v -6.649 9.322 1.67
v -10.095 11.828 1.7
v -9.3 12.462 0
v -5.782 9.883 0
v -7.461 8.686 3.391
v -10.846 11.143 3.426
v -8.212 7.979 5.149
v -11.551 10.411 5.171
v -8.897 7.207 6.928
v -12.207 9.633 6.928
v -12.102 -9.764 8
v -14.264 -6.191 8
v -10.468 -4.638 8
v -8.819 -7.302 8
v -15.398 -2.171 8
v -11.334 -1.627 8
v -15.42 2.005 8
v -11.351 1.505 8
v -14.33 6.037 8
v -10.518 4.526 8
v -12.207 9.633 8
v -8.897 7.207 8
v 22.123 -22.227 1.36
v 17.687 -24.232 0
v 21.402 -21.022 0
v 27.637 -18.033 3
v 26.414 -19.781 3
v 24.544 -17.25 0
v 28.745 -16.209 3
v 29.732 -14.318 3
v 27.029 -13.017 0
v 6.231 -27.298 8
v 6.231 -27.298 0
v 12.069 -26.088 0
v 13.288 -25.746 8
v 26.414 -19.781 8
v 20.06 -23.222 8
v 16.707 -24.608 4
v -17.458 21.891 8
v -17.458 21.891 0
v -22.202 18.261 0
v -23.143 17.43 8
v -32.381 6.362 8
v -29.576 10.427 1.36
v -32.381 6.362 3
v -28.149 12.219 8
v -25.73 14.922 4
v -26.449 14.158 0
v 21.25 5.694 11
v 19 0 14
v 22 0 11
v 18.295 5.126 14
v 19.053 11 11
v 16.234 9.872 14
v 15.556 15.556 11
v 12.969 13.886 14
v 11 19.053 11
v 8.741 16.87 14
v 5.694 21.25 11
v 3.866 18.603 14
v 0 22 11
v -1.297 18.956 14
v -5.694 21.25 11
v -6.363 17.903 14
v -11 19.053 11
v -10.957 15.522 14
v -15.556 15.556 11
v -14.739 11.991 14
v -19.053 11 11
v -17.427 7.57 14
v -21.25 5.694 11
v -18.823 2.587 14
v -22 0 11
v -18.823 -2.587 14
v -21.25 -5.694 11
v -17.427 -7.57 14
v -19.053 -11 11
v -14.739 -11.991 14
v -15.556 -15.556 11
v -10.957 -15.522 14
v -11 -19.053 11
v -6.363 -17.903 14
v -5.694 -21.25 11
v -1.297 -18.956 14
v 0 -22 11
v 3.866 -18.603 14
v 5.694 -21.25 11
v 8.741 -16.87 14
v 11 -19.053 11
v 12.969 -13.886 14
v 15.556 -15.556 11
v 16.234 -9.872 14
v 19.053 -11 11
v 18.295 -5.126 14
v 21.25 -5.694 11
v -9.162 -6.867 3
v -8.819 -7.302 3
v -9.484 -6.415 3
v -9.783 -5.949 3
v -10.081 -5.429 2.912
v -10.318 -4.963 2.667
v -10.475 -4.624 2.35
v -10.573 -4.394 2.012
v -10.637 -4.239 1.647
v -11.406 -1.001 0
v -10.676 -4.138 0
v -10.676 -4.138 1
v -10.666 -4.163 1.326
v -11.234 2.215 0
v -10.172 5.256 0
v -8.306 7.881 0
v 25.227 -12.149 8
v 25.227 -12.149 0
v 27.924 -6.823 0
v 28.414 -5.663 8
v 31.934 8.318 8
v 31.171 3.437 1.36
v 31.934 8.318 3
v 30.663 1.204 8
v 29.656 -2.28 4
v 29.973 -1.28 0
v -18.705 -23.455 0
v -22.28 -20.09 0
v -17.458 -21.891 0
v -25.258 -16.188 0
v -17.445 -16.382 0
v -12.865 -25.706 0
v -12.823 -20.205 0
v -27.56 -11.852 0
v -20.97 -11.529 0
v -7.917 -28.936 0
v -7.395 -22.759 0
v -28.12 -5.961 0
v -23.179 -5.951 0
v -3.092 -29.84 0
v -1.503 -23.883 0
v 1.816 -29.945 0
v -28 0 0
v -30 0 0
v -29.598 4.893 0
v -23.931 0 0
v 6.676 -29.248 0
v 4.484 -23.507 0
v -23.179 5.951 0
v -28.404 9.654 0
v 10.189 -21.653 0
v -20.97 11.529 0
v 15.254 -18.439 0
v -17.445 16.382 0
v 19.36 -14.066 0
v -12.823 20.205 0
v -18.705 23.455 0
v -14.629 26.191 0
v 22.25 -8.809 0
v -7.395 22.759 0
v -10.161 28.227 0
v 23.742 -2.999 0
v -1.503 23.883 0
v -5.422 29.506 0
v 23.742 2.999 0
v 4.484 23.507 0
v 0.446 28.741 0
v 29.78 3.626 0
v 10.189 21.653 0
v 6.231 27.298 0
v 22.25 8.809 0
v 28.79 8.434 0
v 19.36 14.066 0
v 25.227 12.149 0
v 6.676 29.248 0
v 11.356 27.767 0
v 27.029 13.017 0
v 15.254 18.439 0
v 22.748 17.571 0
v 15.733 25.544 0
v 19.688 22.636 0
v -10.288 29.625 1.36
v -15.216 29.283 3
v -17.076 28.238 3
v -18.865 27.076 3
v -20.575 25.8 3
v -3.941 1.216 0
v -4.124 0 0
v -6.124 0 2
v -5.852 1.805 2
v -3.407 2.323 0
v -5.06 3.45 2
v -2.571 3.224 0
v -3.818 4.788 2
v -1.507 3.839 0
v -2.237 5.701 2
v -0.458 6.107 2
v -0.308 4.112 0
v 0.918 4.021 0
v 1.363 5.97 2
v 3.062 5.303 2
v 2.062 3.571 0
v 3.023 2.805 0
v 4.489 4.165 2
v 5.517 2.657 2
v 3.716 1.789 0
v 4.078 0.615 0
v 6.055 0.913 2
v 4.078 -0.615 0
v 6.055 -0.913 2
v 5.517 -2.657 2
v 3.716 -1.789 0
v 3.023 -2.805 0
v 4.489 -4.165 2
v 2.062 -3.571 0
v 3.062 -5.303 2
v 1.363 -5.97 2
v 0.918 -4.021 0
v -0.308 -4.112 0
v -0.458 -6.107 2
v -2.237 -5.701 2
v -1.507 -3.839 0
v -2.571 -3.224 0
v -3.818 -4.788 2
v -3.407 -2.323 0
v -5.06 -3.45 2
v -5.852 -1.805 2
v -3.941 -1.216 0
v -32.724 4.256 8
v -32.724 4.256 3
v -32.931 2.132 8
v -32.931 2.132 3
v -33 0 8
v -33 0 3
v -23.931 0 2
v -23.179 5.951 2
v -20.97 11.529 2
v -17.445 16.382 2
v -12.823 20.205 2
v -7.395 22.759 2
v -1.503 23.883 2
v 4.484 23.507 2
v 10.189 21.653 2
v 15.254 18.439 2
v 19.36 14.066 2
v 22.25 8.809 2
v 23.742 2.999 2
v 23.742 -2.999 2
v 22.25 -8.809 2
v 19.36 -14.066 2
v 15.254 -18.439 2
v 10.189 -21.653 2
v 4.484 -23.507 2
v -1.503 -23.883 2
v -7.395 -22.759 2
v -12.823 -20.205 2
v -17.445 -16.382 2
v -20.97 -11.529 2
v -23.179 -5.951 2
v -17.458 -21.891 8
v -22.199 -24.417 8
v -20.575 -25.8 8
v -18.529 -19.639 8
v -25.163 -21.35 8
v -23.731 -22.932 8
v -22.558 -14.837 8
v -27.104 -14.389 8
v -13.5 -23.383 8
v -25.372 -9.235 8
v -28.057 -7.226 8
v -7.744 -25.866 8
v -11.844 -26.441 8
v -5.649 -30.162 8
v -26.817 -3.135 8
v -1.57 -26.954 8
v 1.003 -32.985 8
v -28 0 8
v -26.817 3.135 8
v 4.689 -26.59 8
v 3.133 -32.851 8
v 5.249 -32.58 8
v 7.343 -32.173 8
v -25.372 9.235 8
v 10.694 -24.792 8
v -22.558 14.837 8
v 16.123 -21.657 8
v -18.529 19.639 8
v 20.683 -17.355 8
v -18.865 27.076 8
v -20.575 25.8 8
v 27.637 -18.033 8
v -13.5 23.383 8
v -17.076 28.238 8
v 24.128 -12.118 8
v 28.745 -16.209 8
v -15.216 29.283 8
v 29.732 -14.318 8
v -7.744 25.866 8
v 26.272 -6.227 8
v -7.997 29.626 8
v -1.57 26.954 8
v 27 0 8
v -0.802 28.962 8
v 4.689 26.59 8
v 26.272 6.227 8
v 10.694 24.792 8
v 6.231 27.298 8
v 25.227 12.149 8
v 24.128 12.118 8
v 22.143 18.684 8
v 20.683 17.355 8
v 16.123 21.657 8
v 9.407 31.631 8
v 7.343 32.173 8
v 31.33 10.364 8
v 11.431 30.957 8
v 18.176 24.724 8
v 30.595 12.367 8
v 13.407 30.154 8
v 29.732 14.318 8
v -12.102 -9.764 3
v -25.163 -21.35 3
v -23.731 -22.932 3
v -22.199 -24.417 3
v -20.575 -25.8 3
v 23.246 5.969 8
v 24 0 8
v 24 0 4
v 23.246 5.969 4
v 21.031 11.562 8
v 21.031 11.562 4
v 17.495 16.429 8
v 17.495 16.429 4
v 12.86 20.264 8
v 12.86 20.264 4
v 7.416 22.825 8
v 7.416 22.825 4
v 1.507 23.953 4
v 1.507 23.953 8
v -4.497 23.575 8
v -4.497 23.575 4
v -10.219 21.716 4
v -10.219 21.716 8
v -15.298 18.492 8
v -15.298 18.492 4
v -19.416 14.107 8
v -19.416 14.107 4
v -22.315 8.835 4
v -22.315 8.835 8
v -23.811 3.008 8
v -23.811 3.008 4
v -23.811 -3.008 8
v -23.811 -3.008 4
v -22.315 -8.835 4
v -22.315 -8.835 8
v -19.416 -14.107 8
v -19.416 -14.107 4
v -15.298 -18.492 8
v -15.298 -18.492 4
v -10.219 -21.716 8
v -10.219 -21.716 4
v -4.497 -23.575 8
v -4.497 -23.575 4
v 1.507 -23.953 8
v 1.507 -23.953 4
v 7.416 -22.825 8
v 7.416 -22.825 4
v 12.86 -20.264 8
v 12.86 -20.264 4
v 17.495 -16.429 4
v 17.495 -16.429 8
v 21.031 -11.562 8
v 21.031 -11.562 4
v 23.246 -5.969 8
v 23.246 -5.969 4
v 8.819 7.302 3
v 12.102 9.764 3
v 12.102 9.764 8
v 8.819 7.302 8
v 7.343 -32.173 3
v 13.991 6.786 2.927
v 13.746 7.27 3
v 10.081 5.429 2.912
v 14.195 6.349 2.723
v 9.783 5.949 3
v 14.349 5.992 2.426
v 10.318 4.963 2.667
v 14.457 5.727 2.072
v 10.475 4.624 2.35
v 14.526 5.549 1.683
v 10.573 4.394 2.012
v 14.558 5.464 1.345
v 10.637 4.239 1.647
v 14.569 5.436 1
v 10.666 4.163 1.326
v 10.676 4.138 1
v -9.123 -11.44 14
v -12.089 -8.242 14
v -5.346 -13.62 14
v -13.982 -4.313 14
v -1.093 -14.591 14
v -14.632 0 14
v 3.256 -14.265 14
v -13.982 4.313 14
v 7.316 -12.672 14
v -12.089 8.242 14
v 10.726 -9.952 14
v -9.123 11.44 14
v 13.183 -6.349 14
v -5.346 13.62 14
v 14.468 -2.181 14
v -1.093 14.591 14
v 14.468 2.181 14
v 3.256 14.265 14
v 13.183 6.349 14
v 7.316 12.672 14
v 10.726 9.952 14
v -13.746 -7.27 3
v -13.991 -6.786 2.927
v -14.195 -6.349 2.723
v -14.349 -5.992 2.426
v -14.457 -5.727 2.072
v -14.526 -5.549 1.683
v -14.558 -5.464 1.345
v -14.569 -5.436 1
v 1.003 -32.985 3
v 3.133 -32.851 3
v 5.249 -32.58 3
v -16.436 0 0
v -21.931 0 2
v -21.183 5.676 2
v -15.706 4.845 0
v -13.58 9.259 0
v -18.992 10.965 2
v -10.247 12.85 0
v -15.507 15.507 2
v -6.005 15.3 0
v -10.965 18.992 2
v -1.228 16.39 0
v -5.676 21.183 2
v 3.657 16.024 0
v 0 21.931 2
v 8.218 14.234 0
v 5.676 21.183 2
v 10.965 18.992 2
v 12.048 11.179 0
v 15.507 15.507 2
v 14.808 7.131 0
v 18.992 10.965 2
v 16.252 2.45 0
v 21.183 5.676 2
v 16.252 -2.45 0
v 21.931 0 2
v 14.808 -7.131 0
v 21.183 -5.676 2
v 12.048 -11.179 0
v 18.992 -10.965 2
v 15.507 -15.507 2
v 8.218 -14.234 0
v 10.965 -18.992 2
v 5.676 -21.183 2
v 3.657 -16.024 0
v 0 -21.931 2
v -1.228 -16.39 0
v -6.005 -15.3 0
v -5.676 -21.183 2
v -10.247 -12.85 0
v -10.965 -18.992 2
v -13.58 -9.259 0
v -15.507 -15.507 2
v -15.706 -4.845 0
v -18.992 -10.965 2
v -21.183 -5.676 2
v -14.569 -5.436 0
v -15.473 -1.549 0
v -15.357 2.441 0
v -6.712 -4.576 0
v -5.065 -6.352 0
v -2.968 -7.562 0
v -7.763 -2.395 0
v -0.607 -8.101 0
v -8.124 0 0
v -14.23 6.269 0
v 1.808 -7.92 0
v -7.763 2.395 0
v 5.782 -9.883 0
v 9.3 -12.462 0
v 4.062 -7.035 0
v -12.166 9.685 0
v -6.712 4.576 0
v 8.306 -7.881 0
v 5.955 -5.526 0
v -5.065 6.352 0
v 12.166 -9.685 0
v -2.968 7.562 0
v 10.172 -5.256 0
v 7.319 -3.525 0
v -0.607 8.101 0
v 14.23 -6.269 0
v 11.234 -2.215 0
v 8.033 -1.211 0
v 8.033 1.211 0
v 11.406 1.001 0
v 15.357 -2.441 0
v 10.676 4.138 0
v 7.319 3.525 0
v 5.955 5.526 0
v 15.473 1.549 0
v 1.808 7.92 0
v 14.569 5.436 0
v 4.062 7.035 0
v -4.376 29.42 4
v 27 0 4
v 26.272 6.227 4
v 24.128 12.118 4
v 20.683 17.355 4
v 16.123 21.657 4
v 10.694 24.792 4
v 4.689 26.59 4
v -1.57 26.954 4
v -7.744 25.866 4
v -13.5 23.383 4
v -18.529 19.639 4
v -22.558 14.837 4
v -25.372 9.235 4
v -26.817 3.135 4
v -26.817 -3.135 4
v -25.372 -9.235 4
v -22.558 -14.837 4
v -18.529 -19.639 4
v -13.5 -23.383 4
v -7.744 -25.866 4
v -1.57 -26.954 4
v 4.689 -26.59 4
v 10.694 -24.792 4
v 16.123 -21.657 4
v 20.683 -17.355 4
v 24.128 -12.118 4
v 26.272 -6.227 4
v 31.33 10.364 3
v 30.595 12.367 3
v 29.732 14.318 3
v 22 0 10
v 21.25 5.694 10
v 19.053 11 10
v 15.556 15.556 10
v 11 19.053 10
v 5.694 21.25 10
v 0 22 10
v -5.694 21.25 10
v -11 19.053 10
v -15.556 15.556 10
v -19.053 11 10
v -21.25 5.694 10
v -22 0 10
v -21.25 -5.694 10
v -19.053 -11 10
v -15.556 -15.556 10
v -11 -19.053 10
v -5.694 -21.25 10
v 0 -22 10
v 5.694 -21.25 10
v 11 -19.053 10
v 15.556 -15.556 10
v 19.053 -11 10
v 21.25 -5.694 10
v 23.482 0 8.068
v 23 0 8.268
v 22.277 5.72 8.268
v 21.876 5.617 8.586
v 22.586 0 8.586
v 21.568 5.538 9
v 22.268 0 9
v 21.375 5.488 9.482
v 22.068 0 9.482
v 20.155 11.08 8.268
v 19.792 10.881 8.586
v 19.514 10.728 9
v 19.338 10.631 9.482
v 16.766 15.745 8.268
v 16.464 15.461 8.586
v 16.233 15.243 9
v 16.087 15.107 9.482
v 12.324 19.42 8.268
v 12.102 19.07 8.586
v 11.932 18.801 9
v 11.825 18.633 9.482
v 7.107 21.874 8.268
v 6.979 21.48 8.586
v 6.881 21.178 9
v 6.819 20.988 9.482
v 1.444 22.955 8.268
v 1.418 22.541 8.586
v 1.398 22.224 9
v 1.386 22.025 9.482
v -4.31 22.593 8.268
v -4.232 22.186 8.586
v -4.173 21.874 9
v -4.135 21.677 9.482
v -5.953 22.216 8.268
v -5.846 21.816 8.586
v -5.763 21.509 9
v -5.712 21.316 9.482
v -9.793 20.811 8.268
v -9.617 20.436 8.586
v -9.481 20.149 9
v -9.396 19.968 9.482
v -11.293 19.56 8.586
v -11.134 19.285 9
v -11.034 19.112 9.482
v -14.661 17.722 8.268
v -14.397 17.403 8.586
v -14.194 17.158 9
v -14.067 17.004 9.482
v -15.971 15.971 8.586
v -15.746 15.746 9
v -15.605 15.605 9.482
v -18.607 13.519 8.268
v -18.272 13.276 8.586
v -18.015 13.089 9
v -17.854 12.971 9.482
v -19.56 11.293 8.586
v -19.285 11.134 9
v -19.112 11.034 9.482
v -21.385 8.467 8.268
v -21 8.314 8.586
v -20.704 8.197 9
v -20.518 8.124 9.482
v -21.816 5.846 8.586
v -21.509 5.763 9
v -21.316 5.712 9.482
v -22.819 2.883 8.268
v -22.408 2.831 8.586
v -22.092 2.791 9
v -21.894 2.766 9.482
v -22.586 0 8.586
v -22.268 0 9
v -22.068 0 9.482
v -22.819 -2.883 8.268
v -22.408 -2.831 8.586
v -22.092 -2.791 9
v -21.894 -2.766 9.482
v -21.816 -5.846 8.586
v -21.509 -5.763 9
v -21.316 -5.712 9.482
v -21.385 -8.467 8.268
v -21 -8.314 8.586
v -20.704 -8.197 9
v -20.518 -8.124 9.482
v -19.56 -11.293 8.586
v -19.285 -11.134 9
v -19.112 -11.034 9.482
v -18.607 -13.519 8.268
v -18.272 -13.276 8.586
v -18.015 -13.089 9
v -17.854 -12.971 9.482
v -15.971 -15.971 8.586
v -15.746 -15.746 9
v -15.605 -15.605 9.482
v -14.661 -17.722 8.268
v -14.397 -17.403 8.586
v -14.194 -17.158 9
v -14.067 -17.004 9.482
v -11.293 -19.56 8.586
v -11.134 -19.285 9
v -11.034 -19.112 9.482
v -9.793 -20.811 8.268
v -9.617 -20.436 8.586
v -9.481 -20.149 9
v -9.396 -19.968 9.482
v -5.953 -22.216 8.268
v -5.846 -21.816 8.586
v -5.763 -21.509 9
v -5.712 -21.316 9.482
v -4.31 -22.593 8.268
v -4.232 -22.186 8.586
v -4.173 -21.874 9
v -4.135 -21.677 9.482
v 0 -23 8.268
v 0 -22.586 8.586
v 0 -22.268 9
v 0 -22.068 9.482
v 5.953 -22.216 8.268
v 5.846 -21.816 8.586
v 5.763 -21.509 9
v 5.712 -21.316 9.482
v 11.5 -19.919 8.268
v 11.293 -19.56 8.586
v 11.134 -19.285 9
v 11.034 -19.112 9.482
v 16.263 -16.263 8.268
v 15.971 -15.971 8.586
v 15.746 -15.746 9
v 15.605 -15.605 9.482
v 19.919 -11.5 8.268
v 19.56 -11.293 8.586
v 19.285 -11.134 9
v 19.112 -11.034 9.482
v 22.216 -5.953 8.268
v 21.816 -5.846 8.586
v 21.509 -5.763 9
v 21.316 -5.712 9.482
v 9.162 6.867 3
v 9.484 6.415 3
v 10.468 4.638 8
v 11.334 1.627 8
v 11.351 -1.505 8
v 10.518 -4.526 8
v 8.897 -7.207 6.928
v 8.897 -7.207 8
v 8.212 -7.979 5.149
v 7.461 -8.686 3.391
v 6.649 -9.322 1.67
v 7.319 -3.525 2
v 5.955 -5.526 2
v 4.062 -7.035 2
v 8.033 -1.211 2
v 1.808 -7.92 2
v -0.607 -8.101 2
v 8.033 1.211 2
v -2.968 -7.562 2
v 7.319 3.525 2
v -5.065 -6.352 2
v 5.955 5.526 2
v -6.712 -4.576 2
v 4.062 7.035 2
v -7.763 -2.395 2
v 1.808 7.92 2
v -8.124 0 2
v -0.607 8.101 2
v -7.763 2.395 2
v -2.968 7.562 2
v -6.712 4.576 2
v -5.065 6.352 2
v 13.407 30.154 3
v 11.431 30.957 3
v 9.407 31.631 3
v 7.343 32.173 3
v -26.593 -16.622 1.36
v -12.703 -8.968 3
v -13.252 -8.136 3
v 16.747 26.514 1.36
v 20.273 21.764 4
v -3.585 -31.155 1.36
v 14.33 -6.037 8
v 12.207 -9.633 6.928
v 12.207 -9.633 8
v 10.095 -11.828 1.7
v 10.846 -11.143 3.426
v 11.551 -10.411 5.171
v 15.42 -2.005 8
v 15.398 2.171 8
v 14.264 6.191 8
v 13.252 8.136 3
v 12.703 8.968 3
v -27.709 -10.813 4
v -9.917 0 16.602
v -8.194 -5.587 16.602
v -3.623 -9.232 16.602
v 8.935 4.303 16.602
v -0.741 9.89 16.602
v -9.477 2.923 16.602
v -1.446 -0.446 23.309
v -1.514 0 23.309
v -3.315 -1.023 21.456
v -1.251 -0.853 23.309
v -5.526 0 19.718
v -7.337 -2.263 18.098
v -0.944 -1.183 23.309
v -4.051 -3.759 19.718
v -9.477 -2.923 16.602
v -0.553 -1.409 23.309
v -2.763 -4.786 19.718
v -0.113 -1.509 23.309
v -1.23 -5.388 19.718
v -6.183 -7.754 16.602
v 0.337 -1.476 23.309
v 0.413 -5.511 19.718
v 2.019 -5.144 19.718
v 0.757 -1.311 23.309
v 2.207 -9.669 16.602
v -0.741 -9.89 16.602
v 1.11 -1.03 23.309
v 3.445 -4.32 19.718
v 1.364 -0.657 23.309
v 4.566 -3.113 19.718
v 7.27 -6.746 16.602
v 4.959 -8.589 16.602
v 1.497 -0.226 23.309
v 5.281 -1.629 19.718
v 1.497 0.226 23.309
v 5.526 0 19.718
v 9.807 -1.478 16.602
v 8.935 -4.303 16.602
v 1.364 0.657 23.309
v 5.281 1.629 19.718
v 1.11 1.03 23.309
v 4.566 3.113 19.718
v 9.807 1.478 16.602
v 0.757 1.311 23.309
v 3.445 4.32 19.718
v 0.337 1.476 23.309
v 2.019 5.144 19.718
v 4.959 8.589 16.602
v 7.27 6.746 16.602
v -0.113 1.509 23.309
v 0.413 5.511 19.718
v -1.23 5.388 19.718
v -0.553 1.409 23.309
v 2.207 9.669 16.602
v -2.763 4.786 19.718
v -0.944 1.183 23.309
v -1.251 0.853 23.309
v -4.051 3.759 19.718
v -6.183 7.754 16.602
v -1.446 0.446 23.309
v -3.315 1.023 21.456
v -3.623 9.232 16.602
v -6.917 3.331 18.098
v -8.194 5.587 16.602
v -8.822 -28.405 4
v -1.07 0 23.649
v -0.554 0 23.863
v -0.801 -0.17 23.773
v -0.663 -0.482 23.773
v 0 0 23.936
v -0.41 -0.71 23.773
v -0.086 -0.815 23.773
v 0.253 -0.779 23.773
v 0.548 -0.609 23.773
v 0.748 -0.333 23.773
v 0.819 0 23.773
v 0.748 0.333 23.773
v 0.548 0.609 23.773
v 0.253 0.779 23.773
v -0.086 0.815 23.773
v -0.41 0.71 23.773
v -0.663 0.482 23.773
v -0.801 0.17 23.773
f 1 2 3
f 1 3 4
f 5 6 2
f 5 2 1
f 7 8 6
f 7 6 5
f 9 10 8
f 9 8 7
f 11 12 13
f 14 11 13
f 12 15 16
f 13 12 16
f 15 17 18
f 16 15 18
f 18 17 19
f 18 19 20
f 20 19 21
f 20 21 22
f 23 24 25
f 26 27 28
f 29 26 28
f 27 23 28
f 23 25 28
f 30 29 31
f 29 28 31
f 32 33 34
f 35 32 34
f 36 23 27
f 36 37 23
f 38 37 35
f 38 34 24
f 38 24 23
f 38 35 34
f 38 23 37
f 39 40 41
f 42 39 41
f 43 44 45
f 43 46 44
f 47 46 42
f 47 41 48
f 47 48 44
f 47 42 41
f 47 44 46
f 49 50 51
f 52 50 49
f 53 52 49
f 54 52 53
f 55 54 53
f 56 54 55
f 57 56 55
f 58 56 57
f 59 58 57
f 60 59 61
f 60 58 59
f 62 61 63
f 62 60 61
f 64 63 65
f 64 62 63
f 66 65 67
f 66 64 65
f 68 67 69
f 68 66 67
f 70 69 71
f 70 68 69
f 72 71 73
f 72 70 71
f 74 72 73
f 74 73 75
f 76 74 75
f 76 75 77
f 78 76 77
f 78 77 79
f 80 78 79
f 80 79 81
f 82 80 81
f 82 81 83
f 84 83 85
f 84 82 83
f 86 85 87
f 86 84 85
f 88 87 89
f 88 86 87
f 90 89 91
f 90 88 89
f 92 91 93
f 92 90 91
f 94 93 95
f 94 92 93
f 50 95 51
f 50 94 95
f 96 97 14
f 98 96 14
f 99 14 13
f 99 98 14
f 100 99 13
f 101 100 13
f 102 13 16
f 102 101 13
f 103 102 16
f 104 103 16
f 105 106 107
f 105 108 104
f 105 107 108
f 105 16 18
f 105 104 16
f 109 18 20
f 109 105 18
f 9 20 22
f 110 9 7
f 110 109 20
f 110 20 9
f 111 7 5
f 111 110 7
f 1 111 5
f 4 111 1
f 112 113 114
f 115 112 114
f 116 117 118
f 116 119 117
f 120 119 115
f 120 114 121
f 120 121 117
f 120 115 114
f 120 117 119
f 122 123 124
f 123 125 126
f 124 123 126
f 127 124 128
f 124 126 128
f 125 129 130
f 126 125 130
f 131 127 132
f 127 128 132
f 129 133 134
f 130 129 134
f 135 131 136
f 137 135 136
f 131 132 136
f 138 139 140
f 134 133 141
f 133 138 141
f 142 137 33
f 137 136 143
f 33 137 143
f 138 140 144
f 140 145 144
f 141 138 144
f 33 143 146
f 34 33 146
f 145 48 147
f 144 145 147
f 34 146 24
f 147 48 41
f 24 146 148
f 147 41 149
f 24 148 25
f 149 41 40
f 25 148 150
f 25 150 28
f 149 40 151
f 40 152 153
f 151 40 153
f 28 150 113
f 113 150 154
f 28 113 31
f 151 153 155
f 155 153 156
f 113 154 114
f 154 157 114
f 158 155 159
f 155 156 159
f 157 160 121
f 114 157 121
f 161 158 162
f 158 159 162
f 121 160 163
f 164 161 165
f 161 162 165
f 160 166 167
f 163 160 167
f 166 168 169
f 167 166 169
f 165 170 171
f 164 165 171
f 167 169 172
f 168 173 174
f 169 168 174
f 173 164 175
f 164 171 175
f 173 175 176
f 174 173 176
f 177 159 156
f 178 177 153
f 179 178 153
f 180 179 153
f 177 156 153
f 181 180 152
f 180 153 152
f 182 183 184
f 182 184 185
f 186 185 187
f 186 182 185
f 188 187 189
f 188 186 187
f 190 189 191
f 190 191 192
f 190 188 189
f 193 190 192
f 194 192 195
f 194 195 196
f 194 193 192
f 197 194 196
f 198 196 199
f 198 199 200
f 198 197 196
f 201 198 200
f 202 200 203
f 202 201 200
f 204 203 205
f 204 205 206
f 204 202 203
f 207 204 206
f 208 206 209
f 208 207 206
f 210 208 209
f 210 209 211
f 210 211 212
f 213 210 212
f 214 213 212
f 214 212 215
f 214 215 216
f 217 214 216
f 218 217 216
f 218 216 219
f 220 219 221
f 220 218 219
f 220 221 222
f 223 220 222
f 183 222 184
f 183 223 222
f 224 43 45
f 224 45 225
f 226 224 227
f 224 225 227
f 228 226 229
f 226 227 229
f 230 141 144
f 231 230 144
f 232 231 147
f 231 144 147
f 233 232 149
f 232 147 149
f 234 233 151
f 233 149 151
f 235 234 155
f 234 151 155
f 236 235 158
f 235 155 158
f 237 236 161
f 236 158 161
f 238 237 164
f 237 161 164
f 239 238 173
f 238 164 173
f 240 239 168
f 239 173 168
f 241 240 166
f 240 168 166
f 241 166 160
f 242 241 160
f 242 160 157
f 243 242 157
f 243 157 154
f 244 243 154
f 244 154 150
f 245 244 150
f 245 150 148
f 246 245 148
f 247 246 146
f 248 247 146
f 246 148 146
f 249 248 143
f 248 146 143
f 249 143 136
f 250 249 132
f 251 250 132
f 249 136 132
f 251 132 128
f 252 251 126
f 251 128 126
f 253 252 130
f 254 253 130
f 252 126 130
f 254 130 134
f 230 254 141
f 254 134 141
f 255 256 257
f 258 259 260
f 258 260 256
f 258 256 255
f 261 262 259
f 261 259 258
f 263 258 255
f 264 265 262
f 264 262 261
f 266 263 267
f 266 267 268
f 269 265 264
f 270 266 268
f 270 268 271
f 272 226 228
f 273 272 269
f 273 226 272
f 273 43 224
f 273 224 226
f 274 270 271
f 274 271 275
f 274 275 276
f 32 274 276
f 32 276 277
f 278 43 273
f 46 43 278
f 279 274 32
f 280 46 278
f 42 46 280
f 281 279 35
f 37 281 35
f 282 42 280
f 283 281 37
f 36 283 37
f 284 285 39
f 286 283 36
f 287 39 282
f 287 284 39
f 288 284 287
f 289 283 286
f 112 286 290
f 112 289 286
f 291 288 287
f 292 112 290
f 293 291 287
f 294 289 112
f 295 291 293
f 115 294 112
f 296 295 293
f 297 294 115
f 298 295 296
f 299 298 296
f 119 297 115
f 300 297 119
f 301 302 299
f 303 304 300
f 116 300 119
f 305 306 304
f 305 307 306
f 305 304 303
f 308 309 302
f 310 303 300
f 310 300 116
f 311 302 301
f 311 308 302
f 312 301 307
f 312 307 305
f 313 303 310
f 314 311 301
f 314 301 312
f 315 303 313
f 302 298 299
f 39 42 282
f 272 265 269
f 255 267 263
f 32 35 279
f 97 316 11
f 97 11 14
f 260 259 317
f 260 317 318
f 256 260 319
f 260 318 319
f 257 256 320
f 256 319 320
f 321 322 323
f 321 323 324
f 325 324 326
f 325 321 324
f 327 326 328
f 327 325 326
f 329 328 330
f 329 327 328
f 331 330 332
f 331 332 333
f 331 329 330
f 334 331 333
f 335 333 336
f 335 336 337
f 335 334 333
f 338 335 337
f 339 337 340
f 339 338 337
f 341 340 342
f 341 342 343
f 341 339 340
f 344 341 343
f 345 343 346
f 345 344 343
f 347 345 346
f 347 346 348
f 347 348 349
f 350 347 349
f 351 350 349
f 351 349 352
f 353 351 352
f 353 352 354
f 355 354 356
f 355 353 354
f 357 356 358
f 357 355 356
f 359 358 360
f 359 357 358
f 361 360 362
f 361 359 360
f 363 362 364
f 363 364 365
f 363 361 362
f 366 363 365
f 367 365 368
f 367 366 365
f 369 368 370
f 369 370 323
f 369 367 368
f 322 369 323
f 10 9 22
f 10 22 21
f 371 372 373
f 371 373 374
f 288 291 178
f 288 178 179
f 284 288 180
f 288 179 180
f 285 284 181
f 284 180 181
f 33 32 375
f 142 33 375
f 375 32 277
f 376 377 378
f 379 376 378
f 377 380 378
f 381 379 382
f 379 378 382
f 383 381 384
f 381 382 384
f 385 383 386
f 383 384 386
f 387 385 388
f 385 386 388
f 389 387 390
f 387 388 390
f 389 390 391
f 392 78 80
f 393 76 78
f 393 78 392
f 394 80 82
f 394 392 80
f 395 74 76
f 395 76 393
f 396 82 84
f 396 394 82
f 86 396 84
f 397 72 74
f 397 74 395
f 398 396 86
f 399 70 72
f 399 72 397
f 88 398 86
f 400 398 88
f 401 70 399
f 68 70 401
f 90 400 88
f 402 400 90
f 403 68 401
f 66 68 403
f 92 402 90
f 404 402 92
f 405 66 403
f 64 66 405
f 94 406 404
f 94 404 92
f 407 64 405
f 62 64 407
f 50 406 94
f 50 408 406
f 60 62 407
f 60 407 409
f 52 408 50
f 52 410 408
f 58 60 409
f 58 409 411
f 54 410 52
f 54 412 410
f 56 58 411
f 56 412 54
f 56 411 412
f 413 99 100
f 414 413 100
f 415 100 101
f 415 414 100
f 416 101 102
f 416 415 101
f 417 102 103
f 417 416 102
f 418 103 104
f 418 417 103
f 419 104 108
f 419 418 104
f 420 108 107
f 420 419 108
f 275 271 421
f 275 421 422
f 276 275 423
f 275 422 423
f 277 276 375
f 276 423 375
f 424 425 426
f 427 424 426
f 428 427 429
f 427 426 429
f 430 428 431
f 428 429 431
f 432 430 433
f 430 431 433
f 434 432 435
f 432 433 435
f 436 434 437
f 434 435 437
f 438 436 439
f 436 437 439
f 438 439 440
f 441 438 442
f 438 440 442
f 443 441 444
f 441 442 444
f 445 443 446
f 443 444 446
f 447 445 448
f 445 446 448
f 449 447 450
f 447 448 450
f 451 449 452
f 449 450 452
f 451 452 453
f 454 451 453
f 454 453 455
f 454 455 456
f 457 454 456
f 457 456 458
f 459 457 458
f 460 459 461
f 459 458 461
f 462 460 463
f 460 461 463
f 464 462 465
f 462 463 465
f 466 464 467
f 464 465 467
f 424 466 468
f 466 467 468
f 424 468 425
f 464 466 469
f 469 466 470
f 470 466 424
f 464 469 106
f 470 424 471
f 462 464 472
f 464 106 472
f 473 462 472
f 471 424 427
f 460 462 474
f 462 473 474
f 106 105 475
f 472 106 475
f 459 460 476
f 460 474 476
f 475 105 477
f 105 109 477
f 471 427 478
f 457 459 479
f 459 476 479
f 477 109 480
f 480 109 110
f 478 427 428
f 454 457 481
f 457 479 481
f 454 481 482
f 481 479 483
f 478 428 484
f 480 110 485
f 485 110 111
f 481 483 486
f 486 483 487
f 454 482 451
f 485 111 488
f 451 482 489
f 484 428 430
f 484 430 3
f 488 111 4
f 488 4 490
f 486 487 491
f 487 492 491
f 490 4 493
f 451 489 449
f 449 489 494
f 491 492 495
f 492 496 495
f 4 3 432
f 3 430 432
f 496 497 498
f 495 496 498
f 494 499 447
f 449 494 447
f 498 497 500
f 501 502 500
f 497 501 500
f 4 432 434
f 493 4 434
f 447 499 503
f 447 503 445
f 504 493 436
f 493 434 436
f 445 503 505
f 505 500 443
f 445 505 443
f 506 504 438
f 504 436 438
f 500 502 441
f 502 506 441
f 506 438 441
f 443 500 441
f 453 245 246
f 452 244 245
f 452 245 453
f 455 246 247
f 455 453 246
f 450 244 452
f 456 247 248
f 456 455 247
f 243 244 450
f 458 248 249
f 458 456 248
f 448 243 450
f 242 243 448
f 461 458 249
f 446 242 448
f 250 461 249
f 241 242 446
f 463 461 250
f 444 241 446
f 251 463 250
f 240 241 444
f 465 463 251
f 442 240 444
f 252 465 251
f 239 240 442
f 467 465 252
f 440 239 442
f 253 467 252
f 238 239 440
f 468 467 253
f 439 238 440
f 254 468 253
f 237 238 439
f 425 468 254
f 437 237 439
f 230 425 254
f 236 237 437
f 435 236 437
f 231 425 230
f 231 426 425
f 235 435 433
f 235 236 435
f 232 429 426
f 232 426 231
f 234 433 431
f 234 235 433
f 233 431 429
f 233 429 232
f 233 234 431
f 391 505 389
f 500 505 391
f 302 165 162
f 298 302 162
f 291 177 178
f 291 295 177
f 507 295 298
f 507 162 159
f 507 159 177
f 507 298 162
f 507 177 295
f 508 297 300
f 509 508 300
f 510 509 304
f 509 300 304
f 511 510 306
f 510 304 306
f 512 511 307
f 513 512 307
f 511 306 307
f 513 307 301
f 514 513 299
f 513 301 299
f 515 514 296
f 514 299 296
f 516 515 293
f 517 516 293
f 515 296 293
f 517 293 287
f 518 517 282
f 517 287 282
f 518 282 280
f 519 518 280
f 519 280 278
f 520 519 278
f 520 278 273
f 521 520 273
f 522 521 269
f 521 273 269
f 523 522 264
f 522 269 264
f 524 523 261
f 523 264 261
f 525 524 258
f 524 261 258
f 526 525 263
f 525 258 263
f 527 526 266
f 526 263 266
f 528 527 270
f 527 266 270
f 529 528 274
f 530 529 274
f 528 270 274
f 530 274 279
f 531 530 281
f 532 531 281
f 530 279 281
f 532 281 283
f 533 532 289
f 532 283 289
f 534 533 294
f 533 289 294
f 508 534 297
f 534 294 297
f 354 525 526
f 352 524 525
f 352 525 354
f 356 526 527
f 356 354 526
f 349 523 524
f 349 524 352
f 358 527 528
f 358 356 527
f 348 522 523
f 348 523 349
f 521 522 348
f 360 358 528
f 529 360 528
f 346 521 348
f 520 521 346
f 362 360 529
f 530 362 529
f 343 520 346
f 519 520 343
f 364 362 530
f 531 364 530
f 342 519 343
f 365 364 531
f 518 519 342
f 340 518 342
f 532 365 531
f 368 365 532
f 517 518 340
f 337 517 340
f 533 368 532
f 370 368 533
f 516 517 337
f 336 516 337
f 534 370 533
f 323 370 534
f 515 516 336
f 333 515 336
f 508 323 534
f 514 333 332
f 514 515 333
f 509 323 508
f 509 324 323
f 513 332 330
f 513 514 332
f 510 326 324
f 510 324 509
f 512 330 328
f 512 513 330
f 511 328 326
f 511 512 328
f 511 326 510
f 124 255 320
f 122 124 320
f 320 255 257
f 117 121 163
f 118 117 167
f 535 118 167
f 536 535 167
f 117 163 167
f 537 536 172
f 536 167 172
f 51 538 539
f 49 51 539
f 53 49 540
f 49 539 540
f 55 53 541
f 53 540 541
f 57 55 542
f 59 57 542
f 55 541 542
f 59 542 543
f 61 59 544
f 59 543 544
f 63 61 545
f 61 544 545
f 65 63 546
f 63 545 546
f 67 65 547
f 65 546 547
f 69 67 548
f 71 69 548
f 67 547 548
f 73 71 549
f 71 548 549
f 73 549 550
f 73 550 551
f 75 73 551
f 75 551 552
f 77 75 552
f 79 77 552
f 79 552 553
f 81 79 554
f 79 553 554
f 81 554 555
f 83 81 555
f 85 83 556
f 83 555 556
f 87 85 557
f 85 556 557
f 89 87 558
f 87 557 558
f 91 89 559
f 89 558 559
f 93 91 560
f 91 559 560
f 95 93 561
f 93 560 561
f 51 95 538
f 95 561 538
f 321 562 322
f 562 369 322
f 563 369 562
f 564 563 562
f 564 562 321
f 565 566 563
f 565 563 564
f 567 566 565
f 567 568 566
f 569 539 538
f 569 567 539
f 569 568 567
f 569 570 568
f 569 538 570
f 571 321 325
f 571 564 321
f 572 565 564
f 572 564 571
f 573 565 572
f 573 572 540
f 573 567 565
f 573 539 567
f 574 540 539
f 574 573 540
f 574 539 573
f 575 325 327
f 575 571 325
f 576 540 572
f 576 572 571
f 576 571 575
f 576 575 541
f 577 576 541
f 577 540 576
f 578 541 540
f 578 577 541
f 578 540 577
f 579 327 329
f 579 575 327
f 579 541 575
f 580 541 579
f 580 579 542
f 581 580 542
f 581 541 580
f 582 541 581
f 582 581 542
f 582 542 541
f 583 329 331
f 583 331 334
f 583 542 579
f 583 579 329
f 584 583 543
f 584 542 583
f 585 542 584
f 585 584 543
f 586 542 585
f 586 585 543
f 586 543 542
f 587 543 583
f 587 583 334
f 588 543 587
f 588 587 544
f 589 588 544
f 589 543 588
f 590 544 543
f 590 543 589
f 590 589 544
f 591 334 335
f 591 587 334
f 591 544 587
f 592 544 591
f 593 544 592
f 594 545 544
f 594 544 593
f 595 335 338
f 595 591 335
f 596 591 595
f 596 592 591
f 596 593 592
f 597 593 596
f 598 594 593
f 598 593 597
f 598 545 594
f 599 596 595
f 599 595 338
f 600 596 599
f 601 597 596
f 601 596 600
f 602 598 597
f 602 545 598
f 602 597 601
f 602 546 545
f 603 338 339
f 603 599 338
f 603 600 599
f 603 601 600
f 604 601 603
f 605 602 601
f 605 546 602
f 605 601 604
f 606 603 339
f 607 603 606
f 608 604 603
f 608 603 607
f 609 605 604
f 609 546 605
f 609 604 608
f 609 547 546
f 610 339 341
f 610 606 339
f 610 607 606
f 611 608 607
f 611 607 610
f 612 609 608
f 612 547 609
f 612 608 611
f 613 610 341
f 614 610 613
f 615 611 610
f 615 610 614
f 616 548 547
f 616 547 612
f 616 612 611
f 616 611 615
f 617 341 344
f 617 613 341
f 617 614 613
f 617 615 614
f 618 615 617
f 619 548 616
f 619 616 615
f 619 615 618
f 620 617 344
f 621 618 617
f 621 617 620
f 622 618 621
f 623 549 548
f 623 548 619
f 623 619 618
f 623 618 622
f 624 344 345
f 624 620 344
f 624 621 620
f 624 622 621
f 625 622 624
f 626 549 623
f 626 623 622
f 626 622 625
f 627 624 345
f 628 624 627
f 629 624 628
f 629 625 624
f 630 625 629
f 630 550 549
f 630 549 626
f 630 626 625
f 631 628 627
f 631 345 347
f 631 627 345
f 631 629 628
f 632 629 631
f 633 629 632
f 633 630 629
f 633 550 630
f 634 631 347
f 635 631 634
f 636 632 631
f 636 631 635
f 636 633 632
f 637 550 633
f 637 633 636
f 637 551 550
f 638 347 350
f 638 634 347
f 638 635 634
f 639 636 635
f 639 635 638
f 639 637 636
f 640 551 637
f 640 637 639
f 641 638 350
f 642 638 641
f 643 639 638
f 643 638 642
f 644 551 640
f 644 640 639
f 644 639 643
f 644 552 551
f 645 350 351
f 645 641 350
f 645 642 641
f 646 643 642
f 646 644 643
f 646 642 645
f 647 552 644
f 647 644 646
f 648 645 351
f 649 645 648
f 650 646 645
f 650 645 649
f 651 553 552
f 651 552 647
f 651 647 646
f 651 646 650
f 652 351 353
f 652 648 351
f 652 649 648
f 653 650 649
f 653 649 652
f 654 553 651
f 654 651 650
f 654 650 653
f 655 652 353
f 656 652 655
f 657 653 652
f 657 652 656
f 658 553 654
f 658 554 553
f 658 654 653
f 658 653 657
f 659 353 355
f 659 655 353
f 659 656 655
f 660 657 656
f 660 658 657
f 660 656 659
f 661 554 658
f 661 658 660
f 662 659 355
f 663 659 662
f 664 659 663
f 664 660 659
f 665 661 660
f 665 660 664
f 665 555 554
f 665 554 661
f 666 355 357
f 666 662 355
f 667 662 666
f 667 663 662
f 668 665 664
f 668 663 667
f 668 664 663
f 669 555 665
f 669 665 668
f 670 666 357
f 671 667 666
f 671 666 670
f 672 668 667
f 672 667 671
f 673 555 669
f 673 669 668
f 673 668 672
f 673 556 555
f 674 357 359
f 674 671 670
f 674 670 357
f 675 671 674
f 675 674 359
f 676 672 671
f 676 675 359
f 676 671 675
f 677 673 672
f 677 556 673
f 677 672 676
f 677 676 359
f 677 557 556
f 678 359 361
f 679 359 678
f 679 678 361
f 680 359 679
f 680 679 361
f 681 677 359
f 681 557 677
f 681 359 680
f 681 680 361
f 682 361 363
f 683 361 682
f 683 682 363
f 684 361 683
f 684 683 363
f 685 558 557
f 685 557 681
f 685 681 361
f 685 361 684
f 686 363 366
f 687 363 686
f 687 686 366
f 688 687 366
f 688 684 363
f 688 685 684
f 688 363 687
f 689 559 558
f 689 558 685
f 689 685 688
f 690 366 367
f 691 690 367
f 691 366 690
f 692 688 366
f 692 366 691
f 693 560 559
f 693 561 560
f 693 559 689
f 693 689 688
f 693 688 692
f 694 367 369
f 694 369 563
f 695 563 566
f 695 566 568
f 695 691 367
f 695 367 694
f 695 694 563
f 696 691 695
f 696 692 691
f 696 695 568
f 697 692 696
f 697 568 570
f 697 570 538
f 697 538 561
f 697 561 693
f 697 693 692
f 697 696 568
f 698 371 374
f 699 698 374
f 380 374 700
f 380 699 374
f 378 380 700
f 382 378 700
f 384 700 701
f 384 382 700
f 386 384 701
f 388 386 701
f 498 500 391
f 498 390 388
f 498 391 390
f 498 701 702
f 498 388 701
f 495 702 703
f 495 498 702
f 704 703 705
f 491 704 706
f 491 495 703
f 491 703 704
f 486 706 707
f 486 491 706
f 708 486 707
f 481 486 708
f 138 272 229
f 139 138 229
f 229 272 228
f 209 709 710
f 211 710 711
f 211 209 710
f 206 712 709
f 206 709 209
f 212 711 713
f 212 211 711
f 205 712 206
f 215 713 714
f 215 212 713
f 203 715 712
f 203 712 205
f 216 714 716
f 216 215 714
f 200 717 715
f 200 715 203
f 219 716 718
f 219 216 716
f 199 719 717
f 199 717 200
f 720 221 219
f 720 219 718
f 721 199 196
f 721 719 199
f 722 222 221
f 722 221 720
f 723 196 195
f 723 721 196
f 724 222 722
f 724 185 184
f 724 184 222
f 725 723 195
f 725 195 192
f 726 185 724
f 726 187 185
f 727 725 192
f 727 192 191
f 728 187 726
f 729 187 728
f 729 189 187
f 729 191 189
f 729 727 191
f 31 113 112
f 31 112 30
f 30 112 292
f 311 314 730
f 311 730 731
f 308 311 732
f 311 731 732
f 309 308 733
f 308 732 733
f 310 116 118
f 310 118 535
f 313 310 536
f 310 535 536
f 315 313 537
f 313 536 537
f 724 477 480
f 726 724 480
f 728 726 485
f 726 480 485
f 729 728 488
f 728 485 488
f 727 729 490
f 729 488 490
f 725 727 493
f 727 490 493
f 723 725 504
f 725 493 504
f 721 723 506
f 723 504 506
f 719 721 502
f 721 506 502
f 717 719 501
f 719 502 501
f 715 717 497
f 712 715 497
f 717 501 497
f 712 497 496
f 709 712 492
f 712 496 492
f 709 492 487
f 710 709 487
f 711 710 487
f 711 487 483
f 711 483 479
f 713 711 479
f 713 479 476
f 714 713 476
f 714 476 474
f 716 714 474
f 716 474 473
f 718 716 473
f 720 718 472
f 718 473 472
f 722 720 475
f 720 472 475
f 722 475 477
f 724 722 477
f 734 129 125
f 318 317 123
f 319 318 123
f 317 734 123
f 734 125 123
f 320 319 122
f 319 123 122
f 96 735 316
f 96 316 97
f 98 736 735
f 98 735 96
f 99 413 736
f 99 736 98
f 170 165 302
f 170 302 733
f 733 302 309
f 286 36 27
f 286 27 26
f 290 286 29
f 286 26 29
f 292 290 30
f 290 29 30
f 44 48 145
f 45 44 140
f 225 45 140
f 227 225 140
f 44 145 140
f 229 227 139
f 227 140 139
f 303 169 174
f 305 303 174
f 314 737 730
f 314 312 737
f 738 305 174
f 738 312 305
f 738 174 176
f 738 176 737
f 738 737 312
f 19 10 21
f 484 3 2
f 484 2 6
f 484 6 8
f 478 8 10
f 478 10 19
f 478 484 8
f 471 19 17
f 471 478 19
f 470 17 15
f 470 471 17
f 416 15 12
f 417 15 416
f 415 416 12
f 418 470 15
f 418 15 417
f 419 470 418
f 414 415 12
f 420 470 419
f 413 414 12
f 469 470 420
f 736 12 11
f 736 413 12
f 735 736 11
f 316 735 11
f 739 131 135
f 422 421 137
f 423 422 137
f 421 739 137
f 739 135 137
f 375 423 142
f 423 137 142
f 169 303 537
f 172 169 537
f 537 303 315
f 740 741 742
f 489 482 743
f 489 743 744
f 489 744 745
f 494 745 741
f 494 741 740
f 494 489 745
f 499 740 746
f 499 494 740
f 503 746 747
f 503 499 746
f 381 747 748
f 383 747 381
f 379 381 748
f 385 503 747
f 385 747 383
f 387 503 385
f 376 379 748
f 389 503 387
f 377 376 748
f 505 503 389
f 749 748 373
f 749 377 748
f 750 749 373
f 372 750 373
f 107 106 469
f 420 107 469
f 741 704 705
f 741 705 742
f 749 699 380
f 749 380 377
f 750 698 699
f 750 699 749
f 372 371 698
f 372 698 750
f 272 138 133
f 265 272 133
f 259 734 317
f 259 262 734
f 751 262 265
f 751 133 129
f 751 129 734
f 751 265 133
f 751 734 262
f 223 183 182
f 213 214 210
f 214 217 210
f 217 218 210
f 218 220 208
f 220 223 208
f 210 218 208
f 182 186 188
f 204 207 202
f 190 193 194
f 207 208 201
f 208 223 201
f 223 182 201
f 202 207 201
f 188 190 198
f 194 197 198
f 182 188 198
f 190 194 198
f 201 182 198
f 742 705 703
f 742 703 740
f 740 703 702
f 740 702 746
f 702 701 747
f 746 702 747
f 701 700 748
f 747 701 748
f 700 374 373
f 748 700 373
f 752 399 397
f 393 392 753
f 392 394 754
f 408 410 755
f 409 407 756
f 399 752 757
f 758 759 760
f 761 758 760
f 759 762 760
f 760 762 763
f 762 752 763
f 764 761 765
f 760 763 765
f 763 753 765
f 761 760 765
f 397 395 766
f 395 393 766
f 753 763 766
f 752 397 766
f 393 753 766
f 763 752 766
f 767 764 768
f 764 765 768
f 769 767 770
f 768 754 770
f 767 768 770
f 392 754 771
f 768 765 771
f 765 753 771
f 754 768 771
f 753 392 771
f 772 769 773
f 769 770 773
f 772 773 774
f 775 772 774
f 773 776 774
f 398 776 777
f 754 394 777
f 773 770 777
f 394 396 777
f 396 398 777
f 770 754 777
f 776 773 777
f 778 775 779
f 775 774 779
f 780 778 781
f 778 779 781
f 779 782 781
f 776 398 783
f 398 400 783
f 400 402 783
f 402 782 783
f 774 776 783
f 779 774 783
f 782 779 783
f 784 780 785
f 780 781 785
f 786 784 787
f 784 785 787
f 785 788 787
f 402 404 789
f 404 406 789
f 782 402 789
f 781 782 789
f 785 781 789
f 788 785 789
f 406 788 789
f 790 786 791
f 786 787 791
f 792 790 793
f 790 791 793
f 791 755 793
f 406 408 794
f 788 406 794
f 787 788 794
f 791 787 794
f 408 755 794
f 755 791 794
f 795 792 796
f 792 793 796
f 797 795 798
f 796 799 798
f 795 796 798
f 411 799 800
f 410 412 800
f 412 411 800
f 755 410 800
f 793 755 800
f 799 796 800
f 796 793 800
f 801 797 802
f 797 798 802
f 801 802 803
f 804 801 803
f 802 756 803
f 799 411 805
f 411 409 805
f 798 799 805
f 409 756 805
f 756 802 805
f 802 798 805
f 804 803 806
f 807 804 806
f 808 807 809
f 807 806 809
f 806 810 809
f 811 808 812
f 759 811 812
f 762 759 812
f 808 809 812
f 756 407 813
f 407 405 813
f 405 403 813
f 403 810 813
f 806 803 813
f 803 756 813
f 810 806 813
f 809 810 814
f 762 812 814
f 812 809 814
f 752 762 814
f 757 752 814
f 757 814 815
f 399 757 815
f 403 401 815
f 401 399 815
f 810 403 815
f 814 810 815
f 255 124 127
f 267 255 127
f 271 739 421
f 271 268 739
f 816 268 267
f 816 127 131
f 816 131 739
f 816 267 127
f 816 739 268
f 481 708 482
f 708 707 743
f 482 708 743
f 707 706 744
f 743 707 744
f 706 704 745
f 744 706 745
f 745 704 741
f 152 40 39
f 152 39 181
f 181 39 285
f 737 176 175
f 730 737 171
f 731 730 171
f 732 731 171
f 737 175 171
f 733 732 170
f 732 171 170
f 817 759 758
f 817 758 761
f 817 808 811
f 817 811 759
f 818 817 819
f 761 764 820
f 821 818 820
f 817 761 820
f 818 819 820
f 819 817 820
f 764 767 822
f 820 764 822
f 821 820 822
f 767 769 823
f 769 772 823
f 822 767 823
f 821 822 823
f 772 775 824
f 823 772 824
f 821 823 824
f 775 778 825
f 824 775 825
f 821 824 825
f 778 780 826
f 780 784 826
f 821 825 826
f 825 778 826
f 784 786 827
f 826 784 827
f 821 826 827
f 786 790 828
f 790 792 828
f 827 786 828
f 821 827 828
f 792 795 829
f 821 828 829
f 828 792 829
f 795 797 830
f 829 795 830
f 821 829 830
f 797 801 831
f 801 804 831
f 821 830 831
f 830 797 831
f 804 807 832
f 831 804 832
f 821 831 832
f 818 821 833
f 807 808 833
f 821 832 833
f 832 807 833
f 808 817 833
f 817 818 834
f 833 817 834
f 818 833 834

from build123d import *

# Parameters (mm, degrees)
ESQUISSE1_R                     = 33
BOSS_EXTRU_1_DEPTH              = 3
ESQUISSE2_R                     = 33
BOSS_EXTRU_2_DEPTH              = 5
CONG_1_R                        = 2
ESQUISSE3_R                     = 22
BOSS_EXTRU_3_DEPTH              = 6
CHANFREIN1_SIZE                 = 3
CONG_2_R                        = 2
CHANFREIN2_SIZE                 = 3
ESQUISSE5_R                     = 27.000000000000004
ESQUISSE5_R_2                   = 24.000000000000004
ENL_V_DE_MAT_EXTRU_MINCE1_DEPTH = 4
ENL_V_MAT_EXTRU_1_DEPTH         = 53.44951392438422
ENL_V_MAT_EXTRU_1_DEPTH_BACK    = 53.44951392438422
ESQUISSE7_R                     = 23.930546597488352
ESQUISSE7_R_2                   = 21.930546597488352
ESQUISSE7_R_3                   = 8.12388129582667
ESQUISSE7_R_4                   = 6.123881295826671
ENL_V_DE_MAT_EXTRU_MINCE2_DEPTH = 2
CHANFREIN3_SIZE                 = 2
CHANFREIN4_SIZE2                = 2
CHANFREIN4_SIZE                 = 5.494954839
CHANFREIN5_SIZE                 = 4
CHANFREIN5_SIZE2                = 6.928203230275547
CHANFREIN6_SIZE                 = 4
CHANFREIN6_SIZE2                = 6.928203230275547


with BuildPart() as part:
    # Esquisse1 → Boss.-Extru.1 (new body)
    with BuildSketch(Plane.XY):
        Circle(ESQUISSE1_R)
        with BuildLine():
            Line((-10.675959520705847, -4.138404077932739), (-14.568869579057516, -5.436040764049933))
            ThreePointArc((-14.568869579057516, -5.436040764049933), (-15.362379148266376, 2.4082788262388735), (-12.206501566003407, 9.633473907119715))
            Line((-12.206501566003407, 9.633473907119715), (-8.89742874273069, 7.206820503386352))
            ThreePointArc((-8.89742874273069, 7.206820503386352), (-11.311848311745987, 1.773298556941165), (-10.675959520705847, -4.138404077932739))
        make_face(mode=Mode.SUBTRACT)
        with BuildLine():
            Line((14.568869579057514, 5.436040764049934), (10.675959520705844, 4.138404077932738))
            ThreePointArc((10.675959520705844, 4.138404077932738), (11.311848311745983, -1.7732985569411592), (8.897428742730693, -7.206820503386345))
            Line((8.897428742730693, -7.206820503386345), (12.206501566003409, -9.633473907119711))
            ThreePointArc((12.206501566003409, -9.633473907119711), (15.362379148266374, -2.4082788262388677), (14.568869579057514, 5.436040764049934))
        make_face(mode=Mode.SUBTRACT)
    extrude(amount=BOSS_EXTRU_1_DEPTH)

    # Esquisse2 → Boss.-Extru.2 (add)
    with BuildSketch(Plane.XY.offset(3)):
        Circle(ESQUISSE2_R)
        with BuildLine():
            Line((-12.102216214336107, -9.764162160751955), (-8.819426211517364, -7.302069658637931))
            ThreePointArc((-8.819426211517364, -7.302069658637931), (-11.449834531594213, -0.061556470926751), (-8.897428742730693, 7.206820503386354))
            Line((-8.897428742730693, 7.206820503386354), (-12.206501566003409, 9.633473907119713))
            ThreePointArc((-12.206501566003409, 9.633473907119713), (-15.549775280898679, -0.08359852601843287), (-12.102216214336107, -9.764162160751955))
        make_face(mode=Mode.SUBTRACT)
        with BuildLine():
            Line((12.102216214336359, 9.76416216075164), (8.819426211517387, 7.302069658637905))
            ThreePointArc((8.819426211517387, 7.302069658637905), (11.449834531594213, 0.06155647092658078), (8.897428742730495, -7.206820503386595))
            Line((8.897428742730495, -7.206820503386595), (12.206501566003364, -9.63347390711977))
            ThreePointArc((12.206501566003364, -9.63347390711977), (15.54977528089868, 0.0835985260181948), (12.102216214336359, 9.76416216075164))
        make_face(mode=Mode.SUBTRACT)
    extrude(amount=BOSS_EXTRU_2_DEPTH)

    # Congé1
    cong_1_edges = [part.edges().sort_by_distance(p)[0] for p in [
        (-12.622414549881682, -4.787222420991336, 3),
        (12.622414549881679, 4.787222420991336, 3),
    ]]
    fillet(cong_1_edges, radius=CONG_1_R)

    # Esquisse3 → Boss.-Extru.3 (add)
    with BuildSketch(Plane.XY.offset(8)):
        Circle(ESQUISSE3_R)
    extrude(amount=BOSS_EXTRU_3_DEPTH)

    # Esquisse4 → Révolution3 (revolve)
    with BuildSketch(Plane(origin=(0, 0, 0), x_dir=(1, 0, 0), z_dir=(0, 1, 0))):
        with BuildLine():
            Line((0, -13.999999999999998), (0, -23.936405555224336))
            ThreePointArc((0, -23.936405555224336), (-0.8193291269458294, -23.773207312008758), (-1.5135934632740111, -23.308523638793037))
            ThreePointArc((-1.5135934632740111, -23.308523638793037), (-7.677772539936917, -18.09763553075605), (-14.631896612797249, -14))
            Line((-14.631896612797249, -14), (0, -13.999999999999998))
        make_face()
    revolve(axis=Axis((0, 0, 13.999999999999998), (0, 0, 1)))

    # Chanfrein1
    chanfrein1_edges = [part.edges().sort_by_distance(p)[0] for p in [
        (-33, 4.04e-15, 0),
    ]]
    chamfer(chanfrein1_edges, length=CHANFREIN1_SIZE)

    # Congé2
    cong_2_edges = [part.edges().sort_by_distance(p)[0] for p in [
        (-22, 1.246e-14, 8),
    ]]
    fillet(cong_2_edges, radius=CONG_2_R)

    # Chanfrein2
    chanfrein2_edges = [part.edges().sort_by_distance(p)[0] for p in [
        (-22, 1.246e-14, 14),
    ]]
    chamfer(chanfrein2_edges, length=CHANFREIN2_SIZE)

    # Esquisse5 → Enlèv. de mat.-Extru.-Mince1 (cut)
    with BuildSketch(Plane.XY.offset(8)):
        Circle(ESQUISSE5_R)
        Circle(ESQUISSE5_R_2, mode=Mode.SUBTRACT)
    extrude(amount=-ENL_V_DE_MAT_EXTRU_MINCE1_DEPTH, mode=Mode.SUBTRACT)

    # Esquisse6 → Enlèv. mat.-Extru.1 (cut, two sides: drawn at the far end of the back side and taken through both)
    with BuildSketch(Plane(origin=(0, 0, 0), x_dir=(-1, 0, 0), z_dir=(0, 0, -1)).offset(-ENL_V_MAT_EXTRU_1_DEPTH_BACK)):
        with BuildLine():
            Line((17.457714452044502, -21.891281509104868), (21.744690267234997, -27.266979149873006))
            Line((21.744690267234997, -27.266979149873006), (10.757517205682898, -34.42702004009948))
            Line((10.757517205682898, -34.42702004009948), (-4.348149134028366, -34.02756682996412))
            add(Edge.make_bspline(
                [(17.457714452044502, -21.891281509104868), (8.150142920234186, -30.55152022572505), (-4.348149134028366, -34.02756682996412)],
                knots=[0, 0, 0, 1, 1, 1], degree=2))
        make_face()
        with BuildLine():
            Line((28, 0), (34.87577535736795, 0))
            Line((34.87577535736795, 0), (33.62333038597071, -13.05433027879381))
            Line((33.62333038597071, -13.05433027879381), (23.89279637742328, -24.61536078399858))
            add(Edge.make_bspline(
                [(28, 0), (28.967671344187806, -12.676522970367387), (23.89279637742328, -24.61536078399858)],
                knots=[0, 0, 0, 1, 1, 1], degree=2))
        make_face()
        with BuildLine():
            Line((-6.230586150776911, -27.29798154109103), (-7.760590104972264, -34.00136685488099))
            Line((-7.760590104972264, -34.00136685488099), (-20.208925843844458, -29.875461527982615))
            Line((-20.208925843844458, -29.875461527982615), (-29.314849661478412, -17.816321017099597))
            add(Edge.make_bspline(
                [(-6.230586150776911, -27.29798154109103), (-18.80460935527342, -25.420599613673357), (-29.314849661478412, -17.816321017099597)],
                knots=[0, 0, 0, 1, 1, 1], degree=2))
        make_face()
        with BuildLine():
            Line((-25.22712830126781, -12.148744695291473), (-31.421987840946983, -15.132031816678607))
            Line((-31.421987840946983, -15.132031816678607), (-35.95763554599567, -2.827071136940631))
            Line((-35.95763554599567, -2.827071136940631), (-32.20687047987901, 11.810977908358138))
            add(Edge.make_bspline(
                [(-25.22712830126781, -12.148744695291473), (-31.59910724213477, -1.1474490067937917), (-32.20687047987901, 11.810977908358138)],
                knots=[0, 0, 0, 1, 1, 1], degree=2))
        make_face()
        with BuildLine():
            Line((-25.22712830126764, 12.148744695291825), (-31.42198784094677, 15.132031816679044))
            Line((-31.42198784094677, 15.132031816679044), (-24.629512279918224, 26.350161481959308))
            Line((-24.629512279918224, 26.350161481959308), (-10.846460926500809, 32.54436956877975))
            add(Edge.make_bspline(
                [(-25.22712830126764, 12.148744695291825), (-20.598832871349522, 23.98975410589561), (-10.846460926500809, 32.54436956877975)],
                knots=[0, 0, 0, 1, 1, 1], degree=2))
        make_face()
        with BuildLine():
            Line((-6.230586150776541, 27.297981541091115), (-7.760590104971805, 34.00136685488109))
            Line((-7.760590104971805, 34.00136685488109), (5.245136083428826, 35.68518505960543))
            Line((5.245136083428826, 35.68518505960543), (18.68155493201407, 28.77118715975353))
            add(Edge.make_bspline(
                [(-6.230586150776541, 27.297981541091115), (5.9127827911769995, 31.062183075042935), (18.68155493201407, 28.77118715975353)],
                knots=[0, 0, 0, 1, 1, 1], degree=2))
        make_face()
        with BuildLine():
            Line((17.457714452044808, 21.891281509104626), (21.74469026723538, 27.266979149872704))
            Line((21.74469026723538, 27.266979149872704), (31.17008999467649, 18.148536442251835))
            Line((31.17008999467649, 18.148536442251835), (34.14197889244976, 3.3327139941706876))
            add(Edge.make_bspline(
                [(17.457714452044808, 21.891281509104626), (27.971952413158835, 14.744154635620854), (34.14197889244976, 3.3327139941706876)],
                knots=[0, 0, 0, 1, 1, 1], degree=2))
        make_face()
    extrude(amount=ENL_V_MAT_EXTRU_1_DEPTH + ENL_V_MAT_EXTRU_1_DEPTH_BACK, mode=Mode.SUBTRACT)

    # Esquisse7 → Enlèv. de mat.-Extru.-Mince2 (cut)
    # profile 1 of 2: a face of its own
    with BuildSketch(Plane(origin=(0, 0, 0), x_dir=(-1, 0, 0), z_dir=(0, 0, -1))):
        Circle(ESQUISSE7_R)
        Circle(ESQUISSE7_R_2, mode=Mode.SUBTRACT)
    # profile 2 of 2: a face of its own
    with BuildSketch(Plane(origin=(0, 0, 0), x_dir=(-1, 0, 0), z_dir=(0, 0, -1))):
        Circle(ESQUISSE7_R_3)
        Circle(ESQUISSE7_R_4, mode=Mode.SUBTRACT)
    extrude(amount=-ENL_V_DE_MAT_EXTRU_MINCE2_DEPTH, mode=Mode.SUBTRACT)

    # Chanfrein3
    chanfrein3_edges = [part.edges().sort_by_distance(p)[0] for p in [
        (6.123881295826671, 7.5e-16, 0),
    ]]
    chamfer(chanfrein3_edges, length=CHANFREIN3_SIZE - 0.0001)  # a hair under: the kernel refuses the full size

    # Chanfrein4
    chanfrein4_edges = [part.edges().sort_by_distance(p)[0] for p in [
        (21.930546597488352, 2.69e-15, 0),
    ]]
    chanfrein4_side = [part.faces().sort_by_distance(p)[0] for p in [
        (21.890546597488353, 2.68e-15, 0),
    ]]
    chamfer(chanfrein4_edges, length=CHANFREIN4_SIZE - 0.0001, length2=CHANFREIN4_SIZE2 - 0.0001, reference=chanfrein4_side[0])  # a hair under: the kernel refuses the full size

    # Chanfrein5
    chanfrein5_edges = [part.edges().sort_by_distance(p)[0] for p in [
        (10.551965154367052, -8.420147205253029, 0),
    ]]
    chanfrein5_side = [part.faces().sort_by_distance(p)[0] for p in [
        (15.970820194651594, 1.96e-15, 0),
    ]]
    chamfer(chanfrein5_edges, length=CHANFREIN5_SIZE, length2=CHANFREIN5_SIZE2, reference=chanfrein5_side[0])

    # Chanfrein6
    chanfrein6_edges = [part.edges().sort_by_distance(p)[0] for p in [
        (-10.55196515436705, 8.420147205253034, 0),
    ]]
    chanfrein6_side = [part.faces().sort_by_distance(p)[0] for p in [
        (10.37156741301878, -3.6198944951765126, 0),
    ]]
    chamfer(chanfrein6_edges, length=CHANFREIN6_SIZE, length2=CHANFREIN6_SIZE2, reference=chanfrein6_side[0])


solid = part.part
